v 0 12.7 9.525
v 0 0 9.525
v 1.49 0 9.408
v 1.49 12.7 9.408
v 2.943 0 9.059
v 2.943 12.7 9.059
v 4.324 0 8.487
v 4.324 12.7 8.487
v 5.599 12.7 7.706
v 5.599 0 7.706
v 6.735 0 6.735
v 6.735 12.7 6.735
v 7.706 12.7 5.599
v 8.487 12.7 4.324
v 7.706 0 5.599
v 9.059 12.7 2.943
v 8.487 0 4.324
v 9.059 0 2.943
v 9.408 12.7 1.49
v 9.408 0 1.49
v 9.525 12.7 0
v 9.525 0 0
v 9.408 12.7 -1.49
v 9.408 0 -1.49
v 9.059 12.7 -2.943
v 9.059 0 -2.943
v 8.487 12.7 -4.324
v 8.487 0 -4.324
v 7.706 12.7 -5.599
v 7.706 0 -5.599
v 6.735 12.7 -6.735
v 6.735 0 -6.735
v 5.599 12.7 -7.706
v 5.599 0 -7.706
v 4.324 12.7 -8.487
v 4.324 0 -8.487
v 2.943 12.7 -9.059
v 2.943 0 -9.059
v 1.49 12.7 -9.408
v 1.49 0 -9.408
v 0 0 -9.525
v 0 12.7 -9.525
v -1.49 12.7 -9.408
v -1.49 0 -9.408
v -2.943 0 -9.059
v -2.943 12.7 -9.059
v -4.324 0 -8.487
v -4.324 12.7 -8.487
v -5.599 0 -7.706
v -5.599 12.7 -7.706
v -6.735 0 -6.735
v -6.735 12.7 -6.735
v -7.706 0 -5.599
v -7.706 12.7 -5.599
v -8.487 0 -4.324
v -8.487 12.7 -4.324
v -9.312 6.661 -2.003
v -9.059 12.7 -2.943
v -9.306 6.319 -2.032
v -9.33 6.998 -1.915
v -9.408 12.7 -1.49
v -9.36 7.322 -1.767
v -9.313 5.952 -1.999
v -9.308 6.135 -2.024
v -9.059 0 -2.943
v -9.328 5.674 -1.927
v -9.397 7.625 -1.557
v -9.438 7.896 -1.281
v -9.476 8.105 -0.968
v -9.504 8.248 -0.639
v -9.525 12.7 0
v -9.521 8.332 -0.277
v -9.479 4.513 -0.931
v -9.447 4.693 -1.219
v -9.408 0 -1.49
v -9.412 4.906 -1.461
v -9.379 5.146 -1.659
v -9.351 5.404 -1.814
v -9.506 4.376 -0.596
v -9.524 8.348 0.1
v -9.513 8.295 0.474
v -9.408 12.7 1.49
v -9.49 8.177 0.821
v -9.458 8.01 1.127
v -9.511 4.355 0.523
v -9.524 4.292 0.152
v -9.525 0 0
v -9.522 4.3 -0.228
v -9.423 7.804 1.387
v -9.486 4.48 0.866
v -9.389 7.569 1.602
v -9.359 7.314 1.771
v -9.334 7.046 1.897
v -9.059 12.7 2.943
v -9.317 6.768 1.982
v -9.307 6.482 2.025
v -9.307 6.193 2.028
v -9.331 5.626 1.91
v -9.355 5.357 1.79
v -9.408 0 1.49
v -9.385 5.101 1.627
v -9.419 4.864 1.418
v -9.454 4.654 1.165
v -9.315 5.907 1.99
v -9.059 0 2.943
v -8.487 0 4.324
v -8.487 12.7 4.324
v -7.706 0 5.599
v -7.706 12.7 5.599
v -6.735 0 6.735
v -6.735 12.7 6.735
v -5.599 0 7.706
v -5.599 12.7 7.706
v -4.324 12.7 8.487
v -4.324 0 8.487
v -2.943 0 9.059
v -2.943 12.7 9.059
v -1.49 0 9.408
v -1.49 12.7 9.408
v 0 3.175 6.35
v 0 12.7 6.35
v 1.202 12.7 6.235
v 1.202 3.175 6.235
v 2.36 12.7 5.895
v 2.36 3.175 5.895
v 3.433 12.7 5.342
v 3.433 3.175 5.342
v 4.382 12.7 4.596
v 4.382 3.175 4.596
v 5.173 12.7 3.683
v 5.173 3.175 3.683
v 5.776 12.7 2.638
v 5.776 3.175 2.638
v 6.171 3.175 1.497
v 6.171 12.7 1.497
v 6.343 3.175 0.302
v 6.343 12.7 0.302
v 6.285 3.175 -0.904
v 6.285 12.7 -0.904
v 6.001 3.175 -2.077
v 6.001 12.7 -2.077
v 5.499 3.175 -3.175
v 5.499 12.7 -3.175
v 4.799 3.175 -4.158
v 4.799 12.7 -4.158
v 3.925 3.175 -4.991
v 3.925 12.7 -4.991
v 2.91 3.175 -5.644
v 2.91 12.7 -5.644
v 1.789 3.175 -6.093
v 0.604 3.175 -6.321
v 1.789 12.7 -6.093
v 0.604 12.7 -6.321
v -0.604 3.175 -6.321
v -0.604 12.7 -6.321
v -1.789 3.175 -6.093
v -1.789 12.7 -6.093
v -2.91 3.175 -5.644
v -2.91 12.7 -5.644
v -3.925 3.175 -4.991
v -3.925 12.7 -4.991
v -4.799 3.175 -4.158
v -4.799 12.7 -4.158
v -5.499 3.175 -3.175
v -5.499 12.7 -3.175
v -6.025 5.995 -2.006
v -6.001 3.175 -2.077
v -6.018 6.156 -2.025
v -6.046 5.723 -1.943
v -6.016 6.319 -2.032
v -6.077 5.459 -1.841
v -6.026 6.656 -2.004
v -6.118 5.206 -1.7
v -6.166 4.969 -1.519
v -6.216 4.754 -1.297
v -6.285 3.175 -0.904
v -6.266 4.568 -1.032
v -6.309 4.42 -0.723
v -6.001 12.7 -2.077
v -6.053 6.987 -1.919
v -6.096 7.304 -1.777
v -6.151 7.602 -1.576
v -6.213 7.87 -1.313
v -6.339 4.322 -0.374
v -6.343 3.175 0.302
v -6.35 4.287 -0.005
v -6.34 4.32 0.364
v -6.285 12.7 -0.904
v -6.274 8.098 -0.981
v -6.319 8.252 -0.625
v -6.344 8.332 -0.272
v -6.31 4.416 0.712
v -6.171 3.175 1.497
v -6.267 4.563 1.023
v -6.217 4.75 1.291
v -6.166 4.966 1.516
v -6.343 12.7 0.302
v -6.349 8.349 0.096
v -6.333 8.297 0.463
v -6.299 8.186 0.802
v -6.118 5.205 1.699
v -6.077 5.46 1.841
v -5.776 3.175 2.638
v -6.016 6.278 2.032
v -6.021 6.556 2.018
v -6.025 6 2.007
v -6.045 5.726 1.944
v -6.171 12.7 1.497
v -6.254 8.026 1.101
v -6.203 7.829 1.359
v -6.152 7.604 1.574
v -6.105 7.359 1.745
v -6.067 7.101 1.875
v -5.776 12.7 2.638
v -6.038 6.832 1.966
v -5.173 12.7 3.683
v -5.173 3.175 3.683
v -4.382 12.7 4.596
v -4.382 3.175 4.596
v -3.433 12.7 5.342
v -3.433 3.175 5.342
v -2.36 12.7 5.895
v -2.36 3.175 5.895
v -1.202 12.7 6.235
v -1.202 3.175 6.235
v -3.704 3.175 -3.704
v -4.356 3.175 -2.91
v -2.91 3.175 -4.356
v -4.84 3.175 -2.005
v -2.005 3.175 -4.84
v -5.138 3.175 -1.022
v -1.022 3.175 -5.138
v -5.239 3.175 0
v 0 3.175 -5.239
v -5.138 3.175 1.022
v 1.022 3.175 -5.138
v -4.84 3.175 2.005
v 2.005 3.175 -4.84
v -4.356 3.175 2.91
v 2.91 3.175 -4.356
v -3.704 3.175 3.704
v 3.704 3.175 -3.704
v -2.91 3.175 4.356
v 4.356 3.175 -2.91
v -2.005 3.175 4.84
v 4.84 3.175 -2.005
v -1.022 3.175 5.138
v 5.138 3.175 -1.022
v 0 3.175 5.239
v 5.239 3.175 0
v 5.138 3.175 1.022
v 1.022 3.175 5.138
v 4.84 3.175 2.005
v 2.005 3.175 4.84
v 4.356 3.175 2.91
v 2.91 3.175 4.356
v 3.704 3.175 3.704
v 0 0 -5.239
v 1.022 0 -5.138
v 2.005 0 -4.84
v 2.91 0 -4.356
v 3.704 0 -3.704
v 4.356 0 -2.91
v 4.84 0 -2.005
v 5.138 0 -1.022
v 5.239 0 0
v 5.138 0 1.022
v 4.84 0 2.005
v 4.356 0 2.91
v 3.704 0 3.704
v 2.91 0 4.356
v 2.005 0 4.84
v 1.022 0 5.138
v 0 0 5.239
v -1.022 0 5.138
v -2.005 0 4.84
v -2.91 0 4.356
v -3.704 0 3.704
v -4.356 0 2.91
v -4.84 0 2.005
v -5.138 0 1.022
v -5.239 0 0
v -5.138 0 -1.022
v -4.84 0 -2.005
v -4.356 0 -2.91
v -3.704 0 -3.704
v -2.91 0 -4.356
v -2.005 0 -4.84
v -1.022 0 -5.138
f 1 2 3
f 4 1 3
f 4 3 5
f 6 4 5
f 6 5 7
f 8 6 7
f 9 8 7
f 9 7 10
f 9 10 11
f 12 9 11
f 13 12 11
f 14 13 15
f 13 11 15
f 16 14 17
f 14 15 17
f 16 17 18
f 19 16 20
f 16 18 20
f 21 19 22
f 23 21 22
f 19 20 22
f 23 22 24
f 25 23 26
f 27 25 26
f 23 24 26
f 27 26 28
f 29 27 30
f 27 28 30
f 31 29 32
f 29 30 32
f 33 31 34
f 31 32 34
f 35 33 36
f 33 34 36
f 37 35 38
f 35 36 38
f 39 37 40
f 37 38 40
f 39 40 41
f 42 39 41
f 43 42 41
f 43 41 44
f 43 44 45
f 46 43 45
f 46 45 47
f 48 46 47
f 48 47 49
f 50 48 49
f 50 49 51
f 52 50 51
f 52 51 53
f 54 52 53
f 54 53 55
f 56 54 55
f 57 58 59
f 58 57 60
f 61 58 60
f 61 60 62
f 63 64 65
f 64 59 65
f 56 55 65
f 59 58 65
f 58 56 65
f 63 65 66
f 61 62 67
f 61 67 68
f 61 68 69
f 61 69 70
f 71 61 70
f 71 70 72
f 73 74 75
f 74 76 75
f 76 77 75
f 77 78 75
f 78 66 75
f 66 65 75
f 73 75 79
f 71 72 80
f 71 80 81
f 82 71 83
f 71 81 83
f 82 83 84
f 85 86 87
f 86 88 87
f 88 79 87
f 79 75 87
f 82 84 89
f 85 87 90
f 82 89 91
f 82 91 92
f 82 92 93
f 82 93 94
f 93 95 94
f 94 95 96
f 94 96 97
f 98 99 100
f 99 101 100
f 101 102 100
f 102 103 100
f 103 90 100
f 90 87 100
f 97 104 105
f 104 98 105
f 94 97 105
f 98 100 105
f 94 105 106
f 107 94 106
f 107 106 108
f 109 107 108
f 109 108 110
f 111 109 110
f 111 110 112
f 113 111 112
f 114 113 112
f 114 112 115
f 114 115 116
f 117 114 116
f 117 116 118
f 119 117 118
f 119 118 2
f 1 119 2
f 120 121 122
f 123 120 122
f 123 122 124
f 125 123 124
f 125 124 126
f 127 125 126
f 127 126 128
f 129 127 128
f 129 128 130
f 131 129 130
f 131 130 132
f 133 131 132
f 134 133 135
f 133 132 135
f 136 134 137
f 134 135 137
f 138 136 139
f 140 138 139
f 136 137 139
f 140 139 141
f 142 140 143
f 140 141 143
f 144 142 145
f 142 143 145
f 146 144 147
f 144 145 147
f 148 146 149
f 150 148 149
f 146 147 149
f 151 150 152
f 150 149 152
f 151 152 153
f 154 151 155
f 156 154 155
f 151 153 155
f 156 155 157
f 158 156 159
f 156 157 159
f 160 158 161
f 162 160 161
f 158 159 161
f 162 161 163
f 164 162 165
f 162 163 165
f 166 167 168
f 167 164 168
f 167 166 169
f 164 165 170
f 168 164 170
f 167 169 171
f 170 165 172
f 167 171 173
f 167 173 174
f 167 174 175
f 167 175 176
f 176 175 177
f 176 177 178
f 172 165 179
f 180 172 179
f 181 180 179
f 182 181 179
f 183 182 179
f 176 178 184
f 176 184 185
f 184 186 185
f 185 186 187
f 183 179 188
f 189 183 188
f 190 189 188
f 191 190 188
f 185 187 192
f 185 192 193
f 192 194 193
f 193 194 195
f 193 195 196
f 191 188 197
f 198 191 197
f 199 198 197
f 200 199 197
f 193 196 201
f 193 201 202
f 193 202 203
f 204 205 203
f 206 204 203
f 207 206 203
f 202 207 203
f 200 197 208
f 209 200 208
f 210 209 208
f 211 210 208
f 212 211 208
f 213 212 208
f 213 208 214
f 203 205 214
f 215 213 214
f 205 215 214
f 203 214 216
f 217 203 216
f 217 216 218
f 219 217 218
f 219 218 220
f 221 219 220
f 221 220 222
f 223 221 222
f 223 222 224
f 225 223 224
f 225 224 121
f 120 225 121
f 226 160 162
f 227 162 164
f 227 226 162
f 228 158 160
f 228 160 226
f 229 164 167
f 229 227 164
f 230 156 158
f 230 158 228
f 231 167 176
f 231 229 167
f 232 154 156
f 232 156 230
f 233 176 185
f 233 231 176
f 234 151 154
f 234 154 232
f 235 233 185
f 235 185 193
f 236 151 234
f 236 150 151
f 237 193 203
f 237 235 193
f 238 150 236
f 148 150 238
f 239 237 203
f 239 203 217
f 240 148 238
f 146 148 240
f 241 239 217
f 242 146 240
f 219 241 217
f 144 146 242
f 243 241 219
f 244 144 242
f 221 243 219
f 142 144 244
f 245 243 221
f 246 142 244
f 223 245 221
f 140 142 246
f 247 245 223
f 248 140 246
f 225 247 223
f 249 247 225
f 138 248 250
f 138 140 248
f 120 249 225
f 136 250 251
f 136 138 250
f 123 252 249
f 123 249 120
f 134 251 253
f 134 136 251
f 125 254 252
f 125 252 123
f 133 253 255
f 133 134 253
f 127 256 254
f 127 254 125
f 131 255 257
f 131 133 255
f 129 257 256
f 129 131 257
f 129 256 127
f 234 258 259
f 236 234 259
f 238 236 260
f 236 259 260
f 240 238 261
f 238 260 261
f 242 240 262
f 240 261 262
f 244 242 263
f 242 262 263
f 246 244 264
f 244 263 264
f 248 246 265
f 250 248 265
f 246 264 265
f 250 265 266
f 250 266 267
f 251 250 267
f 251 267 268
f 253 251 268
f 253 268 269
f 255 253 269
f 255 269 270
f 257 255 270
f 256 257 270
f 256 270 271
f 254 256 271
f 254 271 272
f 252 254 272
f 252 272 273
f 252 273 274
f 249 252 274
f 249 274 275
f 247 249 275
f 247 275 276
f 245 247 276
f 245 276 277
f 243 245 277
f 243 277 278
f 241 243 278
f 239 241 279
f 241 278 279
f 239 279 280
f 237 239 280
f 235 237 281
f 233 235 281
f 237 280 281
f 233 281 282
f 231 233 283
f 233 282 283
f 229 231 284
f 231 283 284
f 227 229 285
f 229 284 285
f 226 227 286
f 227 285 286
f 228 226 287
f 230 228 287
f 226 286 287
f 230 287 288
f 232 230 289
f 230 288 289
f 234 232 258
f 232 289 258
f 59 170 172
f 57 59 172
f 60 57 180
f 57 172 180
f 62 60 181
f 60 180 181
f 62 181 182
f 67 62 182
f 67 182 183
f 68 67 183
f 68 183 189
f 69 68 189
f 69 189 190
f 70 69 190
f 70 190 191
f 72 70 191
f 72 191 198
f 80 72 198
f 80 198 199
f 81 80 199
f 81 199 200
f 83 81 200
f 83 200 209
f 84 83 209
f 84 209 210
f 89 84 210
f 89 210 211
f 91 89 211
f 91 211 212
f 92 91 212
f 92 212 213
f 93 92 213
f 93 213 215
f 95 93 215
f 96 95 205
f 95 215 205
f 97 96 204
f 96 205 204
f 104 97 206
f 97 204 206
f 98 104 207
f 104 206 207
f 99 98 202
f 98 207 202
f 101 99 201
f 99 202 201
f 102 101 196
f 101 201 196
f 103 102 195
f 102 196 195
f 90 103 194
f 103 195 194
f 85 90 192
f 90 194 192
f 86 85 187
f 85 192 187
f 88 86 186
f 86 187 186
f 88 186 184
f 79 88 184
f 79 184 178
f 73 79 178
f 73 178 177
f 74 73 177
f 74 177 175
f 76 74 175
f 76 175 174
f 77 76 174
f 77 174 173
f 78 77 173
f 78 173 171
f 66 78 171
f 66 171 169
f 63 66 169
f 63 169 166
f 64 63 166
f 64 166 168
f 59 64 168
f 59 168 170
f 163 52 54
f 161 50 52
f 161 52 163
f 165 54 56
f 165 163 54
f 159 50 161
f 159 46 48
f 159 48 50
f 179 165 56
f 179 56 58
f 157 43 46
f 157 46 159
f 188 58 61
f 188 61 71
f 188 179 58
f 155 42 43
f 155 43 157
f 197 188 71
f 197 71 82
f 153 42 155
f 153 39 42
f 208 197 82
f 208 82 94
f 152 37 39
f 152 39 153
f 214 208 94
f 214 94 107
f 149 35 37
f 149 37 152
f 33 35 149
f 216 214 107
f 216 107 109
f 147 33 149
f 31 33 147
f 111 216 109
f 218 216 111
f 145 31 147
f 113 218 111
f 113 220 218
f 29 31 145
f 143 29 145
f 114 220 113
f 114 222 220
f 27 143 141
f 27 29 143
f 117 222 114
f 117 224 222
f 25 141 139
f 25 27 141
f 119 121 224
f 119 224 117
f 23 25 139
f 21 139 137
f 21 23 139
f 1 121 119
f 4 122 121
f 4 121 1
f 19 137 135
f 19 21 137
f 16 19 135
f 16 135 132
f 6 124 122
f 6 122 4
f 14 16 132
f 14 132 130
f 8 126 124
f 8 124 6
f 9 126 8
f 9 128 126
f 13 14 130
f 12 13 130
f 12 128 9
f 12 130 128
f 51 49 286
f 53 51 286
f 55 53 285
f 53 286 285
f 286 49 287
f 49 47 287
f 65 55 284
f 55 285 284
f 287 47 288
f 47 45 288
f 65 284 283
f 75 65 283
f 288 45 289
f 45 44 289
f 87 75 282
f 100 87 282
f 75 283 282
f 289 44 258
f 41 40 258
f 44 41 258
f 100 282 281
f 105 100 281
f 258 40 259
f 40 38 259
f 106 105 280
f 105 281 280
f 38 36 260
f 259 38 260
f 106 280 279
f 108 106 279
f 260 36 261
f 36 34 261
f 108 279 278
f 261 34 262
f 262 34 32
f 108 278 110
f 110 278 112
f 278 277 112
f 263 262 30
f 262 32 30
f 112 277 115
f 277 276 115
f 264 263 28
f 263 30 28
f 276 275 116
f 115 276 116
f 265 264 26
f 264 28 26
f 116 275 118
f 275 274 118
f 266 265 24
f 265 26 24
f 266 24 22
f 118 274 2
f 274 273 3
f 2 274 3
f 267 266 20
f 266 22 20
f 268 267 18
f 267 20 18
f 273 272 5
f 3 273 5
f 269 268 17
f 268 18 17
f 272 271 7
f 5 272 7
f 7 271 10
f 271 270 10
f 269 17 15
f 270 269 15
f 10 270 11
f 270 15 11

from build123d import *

# Parameters (mm, degrees)
SKETCH1_R           = 9.525
BOSS_EXTRUDE1_DEPTH = 12.7
SKETCH2_R           = 6.35
CUT_EXTRUDE1_DEPTH  = 9.525
SKETCH3_R           = 2.032
CUT_EXTRUDE2_DEPTH  = 19.513272266
SKETCH4_R           = 5.23875
CUT_EXTRUDE3_DEPTH  = 19.513272438


with BuildPart() as part:
    # Sketch1 → Boss-Extrude1 (new body)
    with BuildSketch(Plane(origin=(0, 0, 0), x_dir=(1, 0, 0), z_dir=(0, 1, 0))):
        with Locations(Location((0, 0, 0), (0, 0, 270))):
            Circle(SKETCH1_R)
    extrude(amount=BOSS_EXTRUDE1_DEPTH)

    # Sketch2 → Cut-Extrude1 (cut)
    with BuildSketch(Plane(origin=(0, 12.7, 0), x_dir=(1, 0, 0), z_dir=(0, 1, 0))):
        with Locations(Location((0, 0, 0), (0, 0, 270))):
            Circle(SKETCH2_R)
    extrude(amount=-CUT_EXTRUDE1_DEPTH, mode=Mode.SUBTRACT)

    # Sketch3 → Cut-Extrude2 (cut, through all)
    with BuildSketch(Plane(origin=(0, 0, 0), x_dir=(0, 0, -1), z_dir=(1, 0, 0))):
        with Locations((0, 6.318769588)):
            Circle(SKETCH3_R)
    extrude(amount=-CUT_EXTRUDE2_DEPTH, mode=Mode.SUBTRACT)

    # Sketch4 → Cut-Extrude3 (cut, through all)
    with BuildSketch(Plane.XZ):
        with Locations(Location((0, 0, 0), (0, 0, 270))):
            Circle(SKETCH4_R)
    extrude(amount=-CUT_EXTRUDE3_DEPTH, mode=Mode.SUBTRACT)


solid = part.part
